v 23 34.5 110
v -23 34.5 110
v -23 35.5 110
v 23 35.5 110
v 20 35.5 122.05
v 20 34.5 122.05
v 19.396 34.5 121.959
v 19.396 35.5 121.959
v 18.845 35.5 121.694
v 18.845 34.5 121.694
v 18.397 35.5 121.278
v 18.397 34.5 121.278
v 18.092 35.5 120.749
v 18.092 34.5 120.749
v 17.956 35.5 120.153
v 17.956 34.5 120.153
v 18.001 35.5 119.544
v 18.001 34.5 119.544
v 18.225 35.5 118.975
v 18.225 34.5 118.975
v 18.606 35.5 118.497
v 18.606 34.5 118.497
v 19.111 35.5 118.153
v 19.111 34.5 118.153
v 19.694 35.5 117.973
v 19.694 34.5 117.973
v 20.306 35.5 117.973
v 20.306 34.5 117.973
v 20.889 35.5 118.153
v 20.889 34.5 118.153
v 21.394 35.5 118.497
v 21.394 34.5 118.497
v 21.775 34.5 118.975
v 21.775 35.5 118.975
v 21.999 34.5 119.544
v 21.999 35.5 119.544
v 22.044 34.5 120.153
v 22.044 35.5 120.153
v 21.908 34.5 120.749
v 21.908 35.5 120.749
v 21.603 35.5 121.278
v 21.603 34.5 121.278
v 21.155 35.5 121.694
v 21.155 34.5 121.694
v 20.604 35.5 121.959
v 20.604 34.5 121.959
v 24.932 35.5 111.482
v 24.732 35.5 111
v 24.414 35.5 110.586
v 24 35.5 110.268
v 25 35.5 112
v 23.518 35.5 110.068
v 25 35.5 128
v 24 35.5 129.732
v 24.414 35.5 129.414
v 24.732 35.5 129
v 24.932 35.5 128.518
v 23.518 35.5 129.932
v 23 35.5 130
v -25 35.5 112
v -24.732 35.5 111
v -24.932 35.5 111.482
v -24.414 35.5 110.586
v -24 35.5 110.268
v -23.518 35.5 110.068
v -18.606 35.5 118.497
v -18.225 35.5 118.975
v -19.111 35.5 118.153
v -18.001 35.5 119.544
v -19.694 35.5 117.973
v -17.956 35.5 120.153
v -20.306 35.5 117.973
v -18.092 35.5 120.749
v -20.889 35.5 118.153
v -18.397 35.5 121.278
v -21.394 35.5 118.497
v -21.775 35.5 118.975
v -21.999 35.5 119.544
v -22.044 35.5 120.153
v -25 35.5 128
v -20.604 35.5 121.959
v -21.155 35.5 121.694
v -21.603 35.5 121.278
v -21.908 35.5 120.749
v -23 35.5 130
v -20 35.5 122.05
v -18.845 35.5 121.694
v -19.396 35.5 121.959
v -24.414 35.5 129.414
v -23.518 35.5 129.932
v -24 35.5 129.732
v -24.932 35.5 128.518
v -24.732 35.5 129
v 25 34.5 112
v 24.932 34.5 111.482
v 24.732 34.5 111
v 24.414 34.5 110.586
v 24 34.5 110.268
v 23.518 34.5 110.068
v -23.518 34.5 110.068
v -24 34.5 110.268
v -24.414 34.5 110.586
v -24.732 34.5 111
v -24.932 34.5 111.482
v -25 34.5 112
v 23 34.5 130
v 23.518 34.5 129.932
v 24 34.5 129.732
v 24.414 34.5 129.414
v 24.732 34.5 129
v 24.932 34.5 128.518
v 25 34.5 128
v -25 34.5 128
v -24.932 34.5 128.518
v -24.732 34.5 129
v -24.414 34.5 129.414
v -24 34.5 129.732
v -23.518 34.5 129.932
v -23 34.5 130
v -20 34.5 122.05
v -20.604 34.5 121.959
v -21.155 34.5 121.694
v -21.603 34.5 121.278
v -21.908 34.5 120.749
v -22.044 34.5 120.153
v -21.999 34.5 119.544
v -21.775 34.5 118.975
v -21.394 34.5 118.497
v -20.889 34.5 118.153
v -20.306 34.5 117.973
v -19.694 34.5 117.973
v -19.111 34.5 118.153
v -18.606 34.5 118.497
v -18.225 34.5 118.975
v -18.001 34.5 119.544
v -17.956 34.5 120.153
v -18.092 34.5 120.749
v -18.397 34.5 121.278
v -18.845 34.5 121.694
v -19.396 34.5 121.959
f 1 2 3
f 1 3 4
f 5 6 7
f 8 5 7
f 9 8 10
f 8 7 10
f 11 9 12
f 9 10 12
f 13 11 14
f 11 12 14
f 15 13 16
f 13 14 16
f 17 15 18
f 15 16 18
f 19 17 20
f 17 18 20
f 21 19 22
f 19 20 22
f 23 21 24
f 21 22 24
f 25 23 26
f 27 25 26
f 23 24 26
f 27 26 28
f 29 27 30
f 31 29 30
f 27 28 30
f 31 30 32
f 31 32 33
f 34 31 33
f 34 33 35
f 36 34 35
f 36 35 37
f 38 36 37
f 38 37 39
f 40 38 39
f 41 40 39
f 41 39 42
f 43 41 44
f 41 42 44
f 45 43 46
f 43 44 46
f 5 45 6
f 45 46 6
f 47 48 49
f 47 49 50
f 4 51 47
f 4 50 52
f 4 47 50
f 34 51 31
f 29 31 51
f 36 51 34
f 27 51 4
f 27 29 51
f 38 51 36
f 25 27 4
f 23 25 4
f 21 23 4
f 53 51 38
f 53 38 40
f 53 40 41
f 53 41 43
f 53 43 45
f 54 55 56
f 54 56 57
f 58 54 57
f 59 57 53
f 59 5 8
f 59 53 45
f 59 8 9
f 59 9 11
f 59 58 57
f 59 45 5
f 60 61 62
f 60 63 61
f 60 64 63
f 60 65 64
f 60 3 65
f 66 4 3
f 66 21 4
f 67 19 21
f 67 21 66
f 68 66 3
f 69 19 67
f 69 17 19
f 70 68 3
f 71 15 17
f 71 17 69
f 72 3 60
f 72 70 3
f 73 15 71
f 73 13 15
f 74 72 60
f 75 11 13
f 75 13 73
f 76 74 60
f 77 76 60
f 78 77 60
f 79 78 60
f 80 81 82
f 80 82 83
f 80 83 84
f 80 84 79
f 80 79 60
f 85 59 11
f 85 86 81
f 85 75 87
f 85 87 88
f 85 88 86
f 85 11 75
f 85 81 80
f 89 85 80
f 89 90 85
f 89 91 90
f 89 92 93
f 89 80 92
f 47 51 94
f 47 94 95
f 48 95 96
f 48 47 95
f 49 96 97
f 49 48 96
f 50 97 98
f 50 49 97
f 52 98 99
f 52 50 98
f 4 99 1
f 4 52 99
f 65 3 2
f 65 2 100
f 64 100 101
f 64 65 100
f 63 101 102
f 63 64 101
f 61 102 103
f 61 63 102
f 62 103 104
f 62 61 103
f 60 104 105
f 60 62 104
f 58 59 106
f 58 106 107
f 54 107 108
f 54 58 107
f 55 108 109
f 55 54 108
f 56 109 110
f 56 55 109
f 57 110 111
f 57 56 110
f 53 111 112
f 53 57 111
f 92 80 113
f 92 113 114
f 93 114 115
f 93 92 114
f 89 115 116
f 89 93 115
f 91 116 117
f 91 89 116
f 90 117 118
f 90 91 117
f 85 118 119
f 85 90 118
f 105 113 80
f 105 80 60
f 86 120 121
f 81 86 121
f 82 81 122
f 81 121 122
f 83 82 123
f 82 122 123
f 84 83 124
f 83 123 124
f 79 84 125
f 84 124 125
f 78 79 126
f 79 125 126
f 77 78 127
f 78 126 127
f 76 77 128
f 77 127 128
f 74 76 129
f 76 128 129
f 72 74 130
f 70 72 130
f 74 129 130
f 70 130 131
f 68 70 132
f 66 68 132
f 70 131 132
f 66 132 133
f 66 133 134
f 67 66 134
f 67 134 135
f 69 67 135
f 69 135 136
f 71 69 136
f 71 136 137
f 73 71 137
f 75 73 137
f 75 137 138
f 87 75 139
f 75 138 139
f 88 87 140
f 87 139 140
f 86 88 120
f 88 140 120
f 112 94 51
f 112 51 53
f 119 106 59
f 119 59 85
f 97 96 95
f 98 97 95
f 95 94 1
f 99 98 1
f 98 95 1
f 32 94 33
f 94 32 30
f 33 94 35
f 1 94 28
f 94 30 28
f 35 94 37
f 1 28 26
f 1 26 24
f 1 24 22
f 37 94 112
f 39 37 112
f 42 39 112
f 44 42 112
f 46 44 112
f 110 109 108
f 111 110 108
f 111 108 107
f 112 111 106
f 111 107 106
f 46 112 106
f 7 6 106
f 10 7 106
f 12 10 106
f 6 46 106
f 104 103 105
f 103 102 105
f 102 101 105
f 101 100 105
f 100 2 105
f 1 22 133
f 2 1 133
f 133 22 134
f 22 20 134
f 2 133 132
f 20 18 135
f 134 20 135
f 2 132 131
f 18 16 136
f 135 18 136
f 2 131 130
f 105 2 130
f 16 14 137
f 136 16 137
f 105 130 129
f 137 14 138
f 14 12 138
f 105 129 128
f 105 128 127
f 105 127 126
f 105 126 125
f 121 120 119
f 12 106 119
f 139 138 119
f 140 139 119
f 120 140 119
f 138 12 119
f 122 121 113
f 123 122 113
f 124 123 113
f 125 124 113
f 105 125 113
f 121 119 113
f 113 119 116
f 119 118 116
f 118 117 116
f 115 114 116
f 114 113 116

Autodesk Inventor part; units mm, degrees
ref_plane "YZ Plane" through (0, 0, 0) normal (1, 0, 0) x (0, 1, 0)
ref_plane "XY Plane" through (0, 0, 0) normal (0, 0, 1) x (1, 0, 0)
sketch "Sketch2" plane through (0, 0, 0) normal (1, 0, 0) x (0, 1, 0)
  circle A0 centre (27, 120) radius 7.5 projected
  line L0 (27, 120) -> (34.5, 120)
  point P0 (0, 0)
ref_plane "Work Plane1" through (0, 34.5, 120) normal (0, 1, 0) x (-1, 0, 0)
sketch "Sketch3" plane through (0, 34.5, 120) normal (0, 1, 0) x (-1, 0, 0)
  line L0 (0, -120) -> (0, 59.5473) construction
  line L1 (-25, 10) -> (25, 10)
  line L2 (25, 10) -> (25, -10)
  line L3 (25, -10) -> (-25, -10)
  line L4 (-25, -10) -> (-25, 10)
  line L5 (-25, 0) -> (25, 0) construction
  point P0 (0, 0)
  point P1 (0, 0)
  point P2 (0, 0)
  dimension "d2" = 20
  dimension "d3" = 50
extrude "Extrusion1" add sketch "Sketch3" along normal blind 1
sketch "Sketch4" plane through (0, 35.5, 120) normal (0, 1, 0) x (1, 0, 0)
  line L0 (25, -10) -> (25, 10) construction
  line L1 (25, 0) -> (-25, 0) construction
  line L2 (-25, 10) -> (-25, -10) construction
  line L3 (-25, -10) -> (25, -10) construction
  line L4 (20, -10) -> (20, 10) construction
  line L5 (25, 10) -> (-25, 10) construction
  line L6 (-20, -10) -> (-20, 10) construction
  point P0 (0, 120)
  point P1 (20, 0)
  point P2 (-20, 0)
  dimension "d6" = 5
  dimension "d7" = 5
hole "Hole1" at (20, 35.5, 120) at (-20, 35.5, 120) direction (0, -1, 0) diameter 4.1 end through all
fillet "Fillet1" radius 2 4 edges at (25, 35, 130) (25, 35, 110) (-25, 35, 130) (-25, 35, 110)
ref_plane "Work Plane2" through (-23, 34.5, 120) normal (0, 0, 1) x (1, 0, 0)
properties part number "Plate" material "Steel, High Strength, Low Alloy"
